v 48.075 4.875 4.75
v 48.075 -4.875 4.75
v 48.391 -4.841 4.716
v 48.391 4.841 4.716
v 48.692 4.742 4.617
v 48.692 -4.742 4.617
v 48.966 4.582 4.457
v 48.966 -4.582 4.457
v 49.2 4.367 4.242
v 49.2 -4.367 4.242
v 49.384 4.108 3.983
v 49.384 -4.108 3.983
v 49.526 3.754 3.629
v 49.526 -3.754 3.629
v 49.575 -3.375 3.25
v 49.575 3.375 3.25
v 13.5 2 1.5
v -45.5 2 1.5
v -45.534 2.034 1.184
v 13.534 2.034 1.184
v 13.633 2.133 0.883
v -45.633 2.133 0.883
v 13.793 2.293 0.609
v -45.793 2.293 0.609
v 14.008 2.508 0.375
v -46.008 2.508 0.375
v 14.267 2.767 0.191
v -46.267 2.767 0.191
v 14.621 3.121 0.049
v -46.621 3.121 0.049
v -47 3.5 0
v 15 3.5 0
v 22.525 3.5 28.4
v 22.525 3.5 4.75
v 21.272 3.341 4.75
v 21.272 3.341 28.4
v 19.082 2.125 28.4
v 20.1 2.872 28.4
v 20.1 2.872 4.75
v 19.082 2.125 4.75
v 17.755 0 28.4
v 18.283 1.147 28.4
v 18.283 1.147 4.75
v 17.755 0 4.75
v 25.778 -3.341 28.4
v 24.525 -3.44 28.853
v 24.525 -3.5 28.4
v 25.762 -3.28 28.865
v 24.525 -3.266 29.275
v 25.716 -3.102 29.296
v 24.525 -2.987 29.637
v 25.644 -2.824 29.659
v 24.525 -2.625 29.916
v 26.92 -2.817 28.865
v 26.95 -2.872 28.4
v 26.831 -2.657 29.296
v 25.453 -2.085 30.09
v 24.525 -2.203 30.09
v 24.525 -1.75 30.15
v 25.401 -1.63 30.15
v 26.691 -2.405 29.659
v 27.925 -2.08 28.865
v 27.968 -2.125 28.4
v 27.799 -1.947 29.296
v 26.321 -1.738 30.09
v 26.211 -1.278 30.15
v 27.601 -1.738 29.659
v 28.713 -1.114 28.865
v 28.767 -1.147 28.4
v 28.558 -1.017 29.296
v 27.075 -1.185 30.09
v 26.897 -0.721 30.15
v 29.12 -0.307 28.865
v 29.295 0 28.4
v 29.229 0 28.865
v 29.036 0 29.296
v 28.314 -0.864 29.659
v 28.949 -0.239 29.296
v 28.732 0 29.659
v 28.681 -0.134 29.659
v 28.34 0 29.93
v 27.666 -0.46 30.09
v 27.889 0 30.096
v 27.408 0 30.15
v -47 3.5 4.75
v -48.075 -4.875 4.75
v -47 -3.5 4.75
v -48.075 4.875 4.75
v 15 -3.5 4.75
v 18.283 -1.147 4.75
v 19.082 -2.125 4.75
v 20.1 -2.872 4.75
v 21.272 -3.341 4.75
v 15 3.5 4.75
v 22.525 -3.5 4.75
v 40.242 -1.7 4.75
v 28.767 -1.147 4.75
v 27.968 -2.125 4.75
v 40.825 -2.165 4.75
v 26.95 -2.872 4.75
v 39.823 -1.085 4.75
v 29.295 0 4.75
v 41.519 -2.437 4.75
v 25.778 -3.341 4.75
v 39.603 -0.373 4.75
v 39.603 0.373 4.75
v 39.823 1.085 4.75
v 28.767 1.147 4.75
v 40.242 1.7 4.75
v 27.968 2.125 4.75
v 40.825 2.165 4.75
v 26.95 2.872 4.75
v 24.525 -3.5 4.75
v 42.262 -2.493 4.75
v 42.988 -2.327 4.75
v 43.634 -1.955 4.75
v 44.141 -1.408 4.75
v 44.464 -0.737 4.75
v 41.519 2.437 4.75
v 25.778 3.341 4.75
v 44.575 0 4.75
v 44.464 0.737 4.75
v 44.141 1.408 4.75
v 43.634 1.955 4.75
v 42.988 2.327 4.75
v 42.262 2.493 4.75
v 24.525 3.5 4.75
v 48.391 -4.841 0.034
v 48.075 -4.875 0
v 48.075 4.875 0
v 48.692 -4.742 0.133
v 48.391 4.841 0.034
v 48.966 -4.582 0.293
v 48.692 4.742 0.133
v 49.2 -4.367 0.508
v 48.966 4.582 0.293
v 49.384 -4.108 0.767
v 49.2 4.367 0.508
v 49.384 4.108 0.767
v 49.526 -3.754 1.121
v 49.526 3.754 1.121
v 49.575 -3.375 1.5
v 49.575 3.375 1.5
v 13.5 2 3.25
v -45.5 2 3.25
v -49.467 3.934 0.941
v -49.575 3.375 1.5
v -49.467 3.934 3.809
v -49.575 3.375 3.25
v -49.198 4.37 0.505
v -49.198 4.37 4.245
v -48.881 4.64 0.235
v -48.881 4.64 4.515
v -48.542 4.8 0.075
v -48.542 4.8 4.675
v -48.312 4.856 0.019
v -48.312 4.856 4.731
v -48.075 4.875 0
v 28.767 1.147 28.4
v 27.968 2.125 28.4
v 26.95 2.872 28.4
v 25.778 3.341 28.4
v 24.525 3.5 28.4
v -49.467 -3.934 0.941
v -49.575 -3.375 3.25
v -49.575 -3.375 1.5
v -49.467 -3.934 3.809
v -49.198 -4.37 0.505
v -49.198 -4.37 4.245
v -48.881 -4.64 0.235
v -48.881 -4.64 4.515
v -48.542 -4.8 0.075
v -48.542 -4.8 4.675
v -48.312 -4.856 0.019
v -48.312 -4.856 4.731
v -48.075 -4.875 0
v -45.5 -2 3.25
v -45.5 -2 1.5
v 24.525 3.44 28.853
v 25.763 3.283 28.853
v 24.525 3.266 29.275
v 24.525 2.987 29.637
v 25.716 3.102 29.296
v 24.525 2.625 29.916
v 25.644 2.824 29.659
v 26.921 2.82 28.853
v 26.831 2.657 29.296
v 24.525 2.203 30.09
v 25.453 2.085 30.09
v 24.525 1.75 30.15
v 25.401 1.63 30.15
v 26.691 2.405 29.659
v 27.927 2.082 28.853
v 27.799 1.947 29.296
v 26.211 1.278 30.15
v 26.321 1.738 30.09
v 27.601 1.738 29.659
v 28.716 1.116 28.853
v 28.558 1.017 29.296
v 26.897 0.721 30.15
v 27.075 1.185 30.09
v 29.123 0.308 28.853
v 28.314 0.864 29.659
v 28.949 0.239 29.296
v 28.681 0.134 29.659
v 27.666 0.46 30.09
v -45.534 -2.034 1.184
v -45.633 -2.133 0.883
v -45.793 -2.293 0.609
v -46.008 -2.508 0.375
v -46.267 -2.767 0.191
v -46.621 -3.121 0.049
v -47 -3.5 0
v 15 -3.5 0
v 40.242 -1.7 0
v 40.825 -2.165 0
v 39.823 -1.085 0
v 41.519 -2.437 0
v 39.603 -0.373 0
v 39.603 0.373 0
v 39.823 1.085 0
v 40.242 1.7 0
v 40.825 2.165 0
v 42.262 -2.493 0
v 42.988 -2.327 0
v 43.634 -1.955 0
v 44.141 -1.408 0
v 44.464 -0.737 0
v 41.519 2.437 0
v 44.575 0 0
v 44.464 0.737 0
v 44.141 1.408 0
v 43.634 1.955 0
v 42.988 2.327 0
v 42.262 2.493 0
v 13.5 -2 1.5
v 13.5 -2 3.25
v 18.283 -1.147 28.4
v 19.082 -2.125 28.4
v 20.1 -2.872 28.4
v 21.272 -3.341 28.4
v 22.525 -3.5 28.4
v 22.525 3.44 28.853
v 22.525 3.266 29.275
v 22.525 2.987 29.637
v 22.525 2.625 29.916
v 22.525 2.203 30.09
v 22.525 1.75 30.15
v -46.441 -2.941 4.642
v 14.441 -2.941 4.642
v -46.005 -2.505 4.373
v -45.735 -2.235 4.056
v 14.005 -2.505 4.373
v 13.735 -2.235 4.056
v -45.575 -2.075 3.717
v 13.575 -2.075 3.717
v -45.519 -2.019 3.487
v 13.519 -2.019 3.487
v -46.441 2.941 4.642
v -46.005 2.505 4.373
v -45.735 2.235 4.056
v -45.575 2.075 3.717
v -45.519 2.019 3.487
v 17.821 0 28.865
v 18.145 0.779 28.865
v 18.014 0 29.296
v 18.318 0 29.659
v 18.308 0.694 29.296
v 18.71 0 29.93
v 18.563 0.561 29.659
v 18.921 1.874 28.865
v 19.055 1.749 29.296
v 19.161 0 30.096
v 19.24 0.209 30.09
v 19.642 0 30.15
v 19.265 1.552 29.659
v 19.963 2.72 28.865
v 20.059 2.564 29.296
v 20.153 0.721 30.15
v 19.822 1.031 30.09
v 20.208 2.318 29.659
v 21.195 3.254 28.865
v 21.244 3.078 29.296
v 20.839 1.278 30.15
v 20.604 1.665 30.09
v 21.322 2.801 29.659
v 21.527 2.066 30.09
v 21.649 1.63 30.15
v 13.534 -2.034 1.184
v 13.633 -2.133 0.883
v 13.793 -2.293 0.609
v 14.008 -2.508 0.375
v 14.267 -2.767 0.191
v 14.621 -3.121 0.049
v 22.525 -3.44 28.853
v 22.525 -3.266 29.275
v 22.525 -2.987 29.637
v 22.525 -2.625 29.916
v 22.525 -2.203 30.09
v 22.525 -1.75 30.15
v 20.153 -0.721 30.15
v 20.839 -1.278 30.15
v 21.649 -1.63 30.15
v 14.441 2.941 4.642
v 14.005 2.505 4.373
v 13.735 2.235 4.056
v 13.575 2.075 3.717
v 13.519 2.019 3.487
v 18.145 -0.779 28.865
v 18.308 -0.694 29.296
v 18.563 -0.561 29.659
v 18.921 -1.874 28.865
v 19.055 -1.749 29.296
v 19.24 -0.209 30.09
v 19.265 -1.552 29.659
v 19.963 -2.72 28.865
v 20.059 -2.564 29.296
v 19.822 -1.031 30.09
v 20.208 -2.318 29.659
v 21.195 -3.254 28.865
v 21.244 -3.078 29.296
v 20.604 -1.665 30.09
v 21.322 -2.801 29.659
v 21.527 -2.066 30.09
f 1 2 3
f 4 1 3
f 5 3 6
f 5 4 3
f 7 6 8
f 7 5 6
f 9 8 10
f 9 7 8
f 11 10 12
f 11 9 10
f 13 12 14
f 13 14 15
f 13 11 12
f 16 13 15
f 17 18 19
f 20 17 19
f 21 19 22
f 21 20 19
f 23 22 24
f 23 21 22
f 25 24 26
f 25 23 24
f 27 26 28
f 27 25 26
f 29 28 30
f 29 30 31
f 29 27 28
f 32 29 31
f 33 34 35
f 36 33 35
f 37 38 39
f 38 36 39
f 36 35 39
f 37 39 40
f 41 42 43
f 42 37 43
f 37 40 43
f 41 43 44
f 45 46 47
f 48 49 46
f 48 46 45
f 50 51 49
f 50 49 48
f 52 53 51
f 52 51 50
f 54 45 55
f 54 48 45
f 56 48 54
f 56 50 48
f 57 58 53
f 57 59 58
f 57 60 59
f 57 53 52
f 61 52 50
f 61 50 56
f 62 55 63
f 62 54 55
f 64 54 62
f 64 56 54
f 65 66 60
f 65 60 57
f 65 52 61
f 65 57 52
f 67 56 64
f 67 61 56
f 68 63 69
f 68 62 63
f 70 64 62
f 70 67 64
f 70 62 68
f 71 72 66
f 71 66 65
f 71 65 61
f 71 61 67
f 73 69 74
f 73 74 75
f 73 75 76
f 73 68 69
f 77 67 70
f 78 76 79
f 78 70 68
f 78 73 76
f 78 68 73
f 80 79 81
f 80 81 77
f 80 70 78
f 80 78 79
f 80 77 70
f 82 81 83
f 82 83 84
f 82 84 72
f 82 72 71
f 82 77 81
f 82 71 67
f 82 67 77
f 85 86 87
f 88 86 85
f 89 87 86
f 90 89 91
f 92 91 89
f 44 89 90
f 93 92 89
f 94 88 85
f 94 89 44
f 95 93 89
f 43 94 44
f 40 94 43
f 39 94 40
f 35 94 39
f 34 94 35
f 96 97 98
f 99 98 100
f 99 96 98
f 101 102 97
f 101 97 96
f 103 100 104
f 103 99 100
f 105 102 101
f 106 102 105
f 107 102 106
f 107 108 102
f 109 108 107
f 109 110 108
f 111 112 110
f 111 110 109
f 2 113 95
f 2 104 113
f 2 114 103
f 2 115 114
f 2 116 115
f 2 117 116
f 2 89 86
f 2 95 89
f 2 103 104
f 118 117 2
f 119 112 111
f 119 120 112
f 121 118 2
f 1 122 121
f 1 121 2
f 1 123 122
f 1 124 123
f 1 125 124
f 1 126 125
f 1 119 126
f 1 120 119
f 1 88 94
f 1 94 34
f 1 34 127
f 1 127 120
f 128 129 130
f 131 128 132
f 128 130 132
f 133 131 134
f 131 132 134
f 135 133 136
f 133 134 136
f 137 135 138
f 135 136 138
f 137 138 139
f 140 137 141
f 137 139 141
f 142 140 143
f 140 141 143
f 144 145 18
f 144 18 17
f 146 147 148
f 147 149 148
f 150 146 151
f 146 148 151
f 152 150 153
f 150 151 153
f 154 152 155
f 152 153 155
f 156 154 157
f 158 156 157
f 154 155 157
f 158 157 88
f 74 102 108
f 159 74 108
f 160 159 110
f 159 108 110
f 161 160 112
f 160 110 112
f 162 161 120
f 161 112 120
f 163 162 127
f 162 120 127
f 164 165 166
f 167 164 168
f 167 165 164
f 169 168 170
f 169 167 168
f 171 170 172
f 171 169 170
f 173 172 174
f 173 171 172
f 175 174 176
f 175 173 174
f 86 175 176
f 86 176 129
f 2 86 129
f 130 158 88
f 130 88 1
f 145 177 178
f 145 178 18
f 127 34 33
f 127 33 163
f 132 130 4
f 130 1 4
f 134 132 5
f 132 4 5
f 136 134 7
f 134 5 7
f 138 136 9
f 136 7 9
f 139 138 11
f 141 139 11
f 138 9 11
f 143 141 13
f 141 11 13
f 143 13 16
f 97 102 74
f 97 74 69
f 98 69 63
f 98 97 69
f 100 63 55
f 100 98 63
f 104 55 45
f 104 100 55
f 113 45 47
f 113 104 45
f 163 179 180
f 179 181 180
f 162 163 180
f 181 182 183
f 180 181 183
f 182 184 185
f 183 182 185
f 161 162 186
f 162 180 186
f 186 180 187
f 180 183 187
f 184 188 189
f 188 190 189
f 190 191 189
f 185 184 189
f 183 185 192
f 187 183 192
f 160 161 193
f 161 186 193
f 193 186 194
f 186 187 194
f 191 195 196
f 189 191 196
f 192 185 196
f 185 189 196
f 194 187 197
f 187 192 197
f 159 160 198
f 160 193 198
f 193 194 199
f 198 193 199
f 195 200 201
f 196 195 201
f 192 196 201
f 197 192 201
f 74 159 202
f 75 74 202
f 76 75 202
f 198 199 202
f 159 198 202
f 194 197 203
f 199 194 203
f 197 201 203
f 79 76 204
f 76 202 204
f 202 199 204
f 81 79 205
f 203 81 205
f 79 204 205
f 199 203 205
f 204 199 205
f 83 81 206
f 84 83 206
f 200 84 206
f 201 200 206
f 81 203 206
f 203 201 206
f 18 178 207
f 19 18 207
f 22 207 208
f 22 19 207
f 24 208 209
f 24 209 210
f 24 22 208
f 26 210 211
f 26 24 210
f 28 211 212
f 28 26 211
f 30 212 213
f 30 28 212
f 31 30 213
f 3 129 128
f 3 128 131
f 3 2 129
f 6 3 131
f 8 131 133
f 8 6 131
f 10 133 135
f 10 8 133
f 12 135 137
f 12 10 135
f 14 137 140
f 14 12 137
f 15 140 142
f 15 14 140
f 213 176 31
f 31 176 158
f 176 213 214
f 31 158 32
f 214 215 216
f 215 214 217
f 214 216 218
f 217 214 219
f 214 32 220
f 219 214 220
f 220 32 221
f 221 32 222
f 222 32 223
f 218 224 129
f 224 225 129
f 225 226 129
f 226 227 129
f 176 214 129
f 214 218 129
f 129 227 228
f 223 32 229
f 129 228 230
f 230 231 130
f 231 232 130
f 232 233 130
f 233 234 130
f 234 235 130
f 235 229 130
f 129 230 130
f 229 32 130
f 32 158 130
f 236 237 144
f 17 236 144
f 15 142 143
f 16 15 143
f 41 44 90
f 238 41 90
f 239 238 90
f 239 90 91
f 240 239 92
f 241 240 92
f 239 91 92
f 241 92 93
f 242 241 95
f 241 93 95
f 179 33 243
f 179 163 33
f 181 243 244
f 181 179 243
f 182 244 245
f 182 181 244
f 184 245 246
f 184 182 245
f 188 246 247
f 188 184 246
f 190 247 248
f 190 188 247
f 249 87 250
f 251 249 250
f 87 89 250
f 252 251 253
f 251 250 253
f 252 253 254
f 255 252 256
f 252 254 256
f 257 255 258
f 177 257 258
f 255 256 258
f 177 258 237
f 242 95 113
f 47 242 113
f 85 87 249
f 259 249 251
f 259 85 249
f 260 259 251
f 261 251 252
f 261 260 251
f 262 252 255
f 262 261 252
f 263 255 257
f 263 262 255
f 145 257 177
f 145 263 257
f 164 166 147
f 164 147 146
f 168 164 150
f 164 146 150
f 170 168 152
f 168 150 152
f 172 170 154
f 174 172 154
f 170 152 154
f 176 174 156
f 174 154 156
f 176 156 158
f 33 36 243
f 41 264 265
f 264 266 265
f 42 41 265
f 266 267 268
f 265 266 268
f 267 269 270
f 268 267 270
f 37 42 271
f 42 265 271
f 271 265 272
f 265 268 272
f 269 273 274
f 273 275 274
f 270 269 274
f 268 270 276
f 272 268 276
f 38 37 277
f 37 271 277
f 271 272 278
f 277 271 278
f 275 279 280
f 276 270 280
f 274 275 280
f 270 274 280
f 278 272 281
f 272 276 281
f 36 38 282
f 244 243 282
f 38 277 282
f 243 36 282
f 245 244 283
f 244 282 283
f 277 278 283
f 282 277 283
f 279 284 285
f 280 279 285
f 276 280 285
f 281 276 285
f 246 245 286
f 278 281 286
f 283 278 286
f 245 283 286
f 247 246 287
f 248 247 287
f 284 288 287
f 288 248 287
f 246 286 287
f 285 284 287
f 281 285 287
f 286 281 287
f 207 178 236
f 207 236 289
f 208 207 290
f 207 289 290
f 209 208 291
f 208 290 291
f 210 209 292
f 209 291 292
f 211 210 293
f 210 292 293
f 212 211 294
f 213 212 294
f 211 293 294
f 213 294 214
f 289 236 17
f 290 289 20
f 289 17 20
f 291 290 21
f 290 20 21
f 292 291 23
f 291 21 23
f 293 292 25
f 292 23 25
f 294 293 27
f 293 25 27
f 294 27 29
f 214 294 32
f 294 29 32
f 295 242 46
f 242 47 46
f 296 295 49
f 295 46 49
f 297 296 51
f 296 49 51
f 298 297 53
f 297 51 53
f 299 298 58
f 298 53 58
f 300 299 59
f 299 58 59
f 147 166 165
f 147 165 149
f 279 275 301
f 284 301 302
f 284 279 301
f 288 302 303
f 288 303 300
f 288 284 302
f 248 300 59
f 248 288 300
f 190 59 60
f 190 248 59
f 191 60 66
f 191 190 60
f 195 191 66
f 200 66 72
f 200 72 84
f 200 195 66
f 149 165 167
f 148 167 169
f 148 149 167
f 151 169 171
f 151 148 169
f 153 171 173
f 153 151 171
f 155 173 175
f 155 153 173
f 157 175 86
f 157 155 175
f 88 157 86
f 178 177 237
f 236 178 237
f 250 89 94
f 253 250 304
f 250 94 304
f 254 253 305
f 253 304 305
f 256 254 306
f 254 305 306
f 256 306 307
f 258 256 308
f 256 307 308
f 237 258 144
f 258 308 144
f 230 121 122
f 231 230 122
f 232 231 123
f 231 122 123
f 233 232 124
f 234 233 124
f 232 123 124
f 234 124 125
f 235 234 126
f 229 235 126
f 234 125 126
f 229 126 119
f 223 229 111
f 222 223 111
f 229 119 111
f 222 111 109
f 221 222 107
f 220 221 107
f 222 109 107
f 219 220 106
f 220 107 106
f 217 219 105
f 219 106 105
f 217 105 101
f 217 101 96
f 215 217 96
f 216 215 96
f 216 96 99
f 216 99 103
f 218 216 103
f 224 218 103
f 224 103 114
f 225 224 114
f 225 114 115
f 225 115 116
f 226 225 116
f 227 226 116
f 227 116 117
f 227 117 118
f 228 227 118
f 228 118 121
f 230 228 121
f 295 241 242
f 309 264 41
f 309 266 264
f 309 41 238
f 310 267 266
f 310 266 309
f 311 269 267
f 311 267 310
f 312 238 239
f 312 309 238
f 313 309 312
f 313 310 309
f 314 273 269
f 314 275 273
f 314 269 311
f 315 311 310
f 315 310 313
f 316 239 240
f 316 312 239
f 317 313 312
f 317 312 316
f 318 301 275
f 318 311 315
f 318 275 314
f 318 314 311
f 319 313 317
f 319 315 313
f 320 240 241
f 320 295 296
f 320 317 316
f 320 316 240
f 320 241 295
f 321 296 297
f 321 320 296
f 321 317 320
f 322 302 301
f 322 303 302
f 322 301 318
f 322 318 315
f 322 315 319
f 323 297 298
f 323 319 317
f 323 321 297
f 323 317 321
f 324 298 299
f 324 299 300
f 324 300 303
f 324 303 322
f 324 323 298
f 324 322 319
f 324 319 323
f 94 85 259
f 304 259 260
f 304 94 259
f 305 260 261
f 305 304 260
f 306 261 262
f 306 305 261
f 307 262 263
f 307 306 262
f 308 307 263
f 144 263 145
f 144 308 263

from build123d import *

# Parameters (mm, degrees)
F0_W        = 99.15
F0_H        = 9.75
F1_DEPTH    = 4.75
F2_R        = 2.5
F3_DEPTH    = 4.751
F4_W        = 12
F4_H        = 7
F5_DEPTH    = 25.4
F6_T1_DEPTH = 37.9
F7_R        = 1.5
F8_R        = 1.75
F9_W        = 59
F9_H        = 4
F10_DEPTH   = 25
F11_R       = 1.5


# Not quite as in the source:
# - a fillet or chamfer that OpenCascade refuses, or shapes differently, is made with other operations: its cross-section is extruded or revolved along the edge and cut away or added


with BuildPart() as f1:
    # F0 (on Top) → F1 (new body)
    with BuildSketch(Plane.XY):
        Rectangle(F0_W, F0_H)
    extrude(amount=F1_DEPTH)

    # F2 (on face) → F3 (cut, through all)
    with BuildSketch(Plane.XY.offset(4.75)):
        with Locations((42.075, 0)):
            Circle(F2_R)
    extrude(amount=-F3_DEPTH, mode=Mode.SUBTRACT)

    # F4 (on face) → F5 (join)
    with BuildSketch(Plane.XY.offset(4.75)):
        with Locations((23.525, 0)):
            Rectangle(F4_W, F4_H)
    extrude(amount=F5_DEPTH)

    # F6: fillet of radius 5 on 4 edges, made by hand

    # F6_s2 → F6_t1 (cut)
    with BuildSketch(Plane.XY.offset(4.75)):
        with BuildLine():
            ThreePointArc((22.525, 3.5), (18.9894660941, 2.0355339059), (17.525, -1.5))
            Line((17.525, -1.5), (17.525, 3.5))
            Line((17.525, 3.5), (22.525, 3.5))
        make_face()
        with BuildLine():
            ThreePointArc((17.525, 1.5), (18.9894660941, -2.0355339059), (22.525, -3.5))
            Line((22.525, -3.5), (17.525, -3.5))
            Line((17.525, -3.5), (17.525, 1.5))
        make_face()
        with BuildLine():
            ThreePointArc((29.525, -1.5), (28.0605339059, 2.0355339059), (24.525, 3.5))
            Line((24.525, 3.5), (29.525, 3.5))
            Line((29.525, 3.5), (29.525, -1.5))
        make_face()
        with BuildLine():
            ThreePointArc((29.525, 1.5), (28.0605339059, -2.0355339059), (24.525, -3.5))
            Line((24.525, -3.5), (29.525, -3.5))
            Line((29.525, -3.5), (29.525, 1.5))
        make_face()
    extrude(amount=F6_T1_DEPTH, mode=Mode.SUBTRACT)

    # F7
    f7_edges = [f1.edges().sort_by_distance(p)[0] for p in [
        (-49.575, 4.875, 2.375),
        (-49.575, -4.875, 2.375),
        (-49.575, 0, 0),
        (-49.575, 0, 4.75),
        (49.575, -4.875, 2.375),
        (49.575, 4.875, 2.375),
        (49.575, 0, 0),
        (49.575, 0, 4.75),
    ]]
    fillet(f7_edges, radius=F7_R)

    # F8
    f8_edges = [f1.edges().sort_by_distance(p)[0] for p in [
        (23.525, -3.5, 30.15),
        (19.56696, -2.531129, 30.15),
        (19.56696, 2.531129, 30.15),
        (23.525, 3.5, 30.15),
        (27.48304, 2.531129, 30.15),
        (27.48304, -2.531129, 30.15),
    ]]
    fillet(f8_edges, radius=F8_R)

    # F9 (on face) → F10 (cut)
    with BuildSketch(Plane.XY.offset(4.75)):
        with Locations((-16, 0)):
            Rectangle(F9_W, F9_H)
    extrude(amount=-F10_DEPTH, mode=Mode.SUBTRACT)

    # F11
    f11_edges = [f1.edges().sort_by_distance(p)[0] for p in [
        (-16, 2, 4.75),
        (-45.5, 0, 4.75),
        (-16, -2, 4.75),
        (13.5, 0, 4.75),
        (13.5, 0, 0),
        (-16, 2, 0),
        (-16, -2, 0),
        (-45.5, 0, 0),
    ]]
    fillet(f11_edges, radius=F11_R)


solid = f1.part
